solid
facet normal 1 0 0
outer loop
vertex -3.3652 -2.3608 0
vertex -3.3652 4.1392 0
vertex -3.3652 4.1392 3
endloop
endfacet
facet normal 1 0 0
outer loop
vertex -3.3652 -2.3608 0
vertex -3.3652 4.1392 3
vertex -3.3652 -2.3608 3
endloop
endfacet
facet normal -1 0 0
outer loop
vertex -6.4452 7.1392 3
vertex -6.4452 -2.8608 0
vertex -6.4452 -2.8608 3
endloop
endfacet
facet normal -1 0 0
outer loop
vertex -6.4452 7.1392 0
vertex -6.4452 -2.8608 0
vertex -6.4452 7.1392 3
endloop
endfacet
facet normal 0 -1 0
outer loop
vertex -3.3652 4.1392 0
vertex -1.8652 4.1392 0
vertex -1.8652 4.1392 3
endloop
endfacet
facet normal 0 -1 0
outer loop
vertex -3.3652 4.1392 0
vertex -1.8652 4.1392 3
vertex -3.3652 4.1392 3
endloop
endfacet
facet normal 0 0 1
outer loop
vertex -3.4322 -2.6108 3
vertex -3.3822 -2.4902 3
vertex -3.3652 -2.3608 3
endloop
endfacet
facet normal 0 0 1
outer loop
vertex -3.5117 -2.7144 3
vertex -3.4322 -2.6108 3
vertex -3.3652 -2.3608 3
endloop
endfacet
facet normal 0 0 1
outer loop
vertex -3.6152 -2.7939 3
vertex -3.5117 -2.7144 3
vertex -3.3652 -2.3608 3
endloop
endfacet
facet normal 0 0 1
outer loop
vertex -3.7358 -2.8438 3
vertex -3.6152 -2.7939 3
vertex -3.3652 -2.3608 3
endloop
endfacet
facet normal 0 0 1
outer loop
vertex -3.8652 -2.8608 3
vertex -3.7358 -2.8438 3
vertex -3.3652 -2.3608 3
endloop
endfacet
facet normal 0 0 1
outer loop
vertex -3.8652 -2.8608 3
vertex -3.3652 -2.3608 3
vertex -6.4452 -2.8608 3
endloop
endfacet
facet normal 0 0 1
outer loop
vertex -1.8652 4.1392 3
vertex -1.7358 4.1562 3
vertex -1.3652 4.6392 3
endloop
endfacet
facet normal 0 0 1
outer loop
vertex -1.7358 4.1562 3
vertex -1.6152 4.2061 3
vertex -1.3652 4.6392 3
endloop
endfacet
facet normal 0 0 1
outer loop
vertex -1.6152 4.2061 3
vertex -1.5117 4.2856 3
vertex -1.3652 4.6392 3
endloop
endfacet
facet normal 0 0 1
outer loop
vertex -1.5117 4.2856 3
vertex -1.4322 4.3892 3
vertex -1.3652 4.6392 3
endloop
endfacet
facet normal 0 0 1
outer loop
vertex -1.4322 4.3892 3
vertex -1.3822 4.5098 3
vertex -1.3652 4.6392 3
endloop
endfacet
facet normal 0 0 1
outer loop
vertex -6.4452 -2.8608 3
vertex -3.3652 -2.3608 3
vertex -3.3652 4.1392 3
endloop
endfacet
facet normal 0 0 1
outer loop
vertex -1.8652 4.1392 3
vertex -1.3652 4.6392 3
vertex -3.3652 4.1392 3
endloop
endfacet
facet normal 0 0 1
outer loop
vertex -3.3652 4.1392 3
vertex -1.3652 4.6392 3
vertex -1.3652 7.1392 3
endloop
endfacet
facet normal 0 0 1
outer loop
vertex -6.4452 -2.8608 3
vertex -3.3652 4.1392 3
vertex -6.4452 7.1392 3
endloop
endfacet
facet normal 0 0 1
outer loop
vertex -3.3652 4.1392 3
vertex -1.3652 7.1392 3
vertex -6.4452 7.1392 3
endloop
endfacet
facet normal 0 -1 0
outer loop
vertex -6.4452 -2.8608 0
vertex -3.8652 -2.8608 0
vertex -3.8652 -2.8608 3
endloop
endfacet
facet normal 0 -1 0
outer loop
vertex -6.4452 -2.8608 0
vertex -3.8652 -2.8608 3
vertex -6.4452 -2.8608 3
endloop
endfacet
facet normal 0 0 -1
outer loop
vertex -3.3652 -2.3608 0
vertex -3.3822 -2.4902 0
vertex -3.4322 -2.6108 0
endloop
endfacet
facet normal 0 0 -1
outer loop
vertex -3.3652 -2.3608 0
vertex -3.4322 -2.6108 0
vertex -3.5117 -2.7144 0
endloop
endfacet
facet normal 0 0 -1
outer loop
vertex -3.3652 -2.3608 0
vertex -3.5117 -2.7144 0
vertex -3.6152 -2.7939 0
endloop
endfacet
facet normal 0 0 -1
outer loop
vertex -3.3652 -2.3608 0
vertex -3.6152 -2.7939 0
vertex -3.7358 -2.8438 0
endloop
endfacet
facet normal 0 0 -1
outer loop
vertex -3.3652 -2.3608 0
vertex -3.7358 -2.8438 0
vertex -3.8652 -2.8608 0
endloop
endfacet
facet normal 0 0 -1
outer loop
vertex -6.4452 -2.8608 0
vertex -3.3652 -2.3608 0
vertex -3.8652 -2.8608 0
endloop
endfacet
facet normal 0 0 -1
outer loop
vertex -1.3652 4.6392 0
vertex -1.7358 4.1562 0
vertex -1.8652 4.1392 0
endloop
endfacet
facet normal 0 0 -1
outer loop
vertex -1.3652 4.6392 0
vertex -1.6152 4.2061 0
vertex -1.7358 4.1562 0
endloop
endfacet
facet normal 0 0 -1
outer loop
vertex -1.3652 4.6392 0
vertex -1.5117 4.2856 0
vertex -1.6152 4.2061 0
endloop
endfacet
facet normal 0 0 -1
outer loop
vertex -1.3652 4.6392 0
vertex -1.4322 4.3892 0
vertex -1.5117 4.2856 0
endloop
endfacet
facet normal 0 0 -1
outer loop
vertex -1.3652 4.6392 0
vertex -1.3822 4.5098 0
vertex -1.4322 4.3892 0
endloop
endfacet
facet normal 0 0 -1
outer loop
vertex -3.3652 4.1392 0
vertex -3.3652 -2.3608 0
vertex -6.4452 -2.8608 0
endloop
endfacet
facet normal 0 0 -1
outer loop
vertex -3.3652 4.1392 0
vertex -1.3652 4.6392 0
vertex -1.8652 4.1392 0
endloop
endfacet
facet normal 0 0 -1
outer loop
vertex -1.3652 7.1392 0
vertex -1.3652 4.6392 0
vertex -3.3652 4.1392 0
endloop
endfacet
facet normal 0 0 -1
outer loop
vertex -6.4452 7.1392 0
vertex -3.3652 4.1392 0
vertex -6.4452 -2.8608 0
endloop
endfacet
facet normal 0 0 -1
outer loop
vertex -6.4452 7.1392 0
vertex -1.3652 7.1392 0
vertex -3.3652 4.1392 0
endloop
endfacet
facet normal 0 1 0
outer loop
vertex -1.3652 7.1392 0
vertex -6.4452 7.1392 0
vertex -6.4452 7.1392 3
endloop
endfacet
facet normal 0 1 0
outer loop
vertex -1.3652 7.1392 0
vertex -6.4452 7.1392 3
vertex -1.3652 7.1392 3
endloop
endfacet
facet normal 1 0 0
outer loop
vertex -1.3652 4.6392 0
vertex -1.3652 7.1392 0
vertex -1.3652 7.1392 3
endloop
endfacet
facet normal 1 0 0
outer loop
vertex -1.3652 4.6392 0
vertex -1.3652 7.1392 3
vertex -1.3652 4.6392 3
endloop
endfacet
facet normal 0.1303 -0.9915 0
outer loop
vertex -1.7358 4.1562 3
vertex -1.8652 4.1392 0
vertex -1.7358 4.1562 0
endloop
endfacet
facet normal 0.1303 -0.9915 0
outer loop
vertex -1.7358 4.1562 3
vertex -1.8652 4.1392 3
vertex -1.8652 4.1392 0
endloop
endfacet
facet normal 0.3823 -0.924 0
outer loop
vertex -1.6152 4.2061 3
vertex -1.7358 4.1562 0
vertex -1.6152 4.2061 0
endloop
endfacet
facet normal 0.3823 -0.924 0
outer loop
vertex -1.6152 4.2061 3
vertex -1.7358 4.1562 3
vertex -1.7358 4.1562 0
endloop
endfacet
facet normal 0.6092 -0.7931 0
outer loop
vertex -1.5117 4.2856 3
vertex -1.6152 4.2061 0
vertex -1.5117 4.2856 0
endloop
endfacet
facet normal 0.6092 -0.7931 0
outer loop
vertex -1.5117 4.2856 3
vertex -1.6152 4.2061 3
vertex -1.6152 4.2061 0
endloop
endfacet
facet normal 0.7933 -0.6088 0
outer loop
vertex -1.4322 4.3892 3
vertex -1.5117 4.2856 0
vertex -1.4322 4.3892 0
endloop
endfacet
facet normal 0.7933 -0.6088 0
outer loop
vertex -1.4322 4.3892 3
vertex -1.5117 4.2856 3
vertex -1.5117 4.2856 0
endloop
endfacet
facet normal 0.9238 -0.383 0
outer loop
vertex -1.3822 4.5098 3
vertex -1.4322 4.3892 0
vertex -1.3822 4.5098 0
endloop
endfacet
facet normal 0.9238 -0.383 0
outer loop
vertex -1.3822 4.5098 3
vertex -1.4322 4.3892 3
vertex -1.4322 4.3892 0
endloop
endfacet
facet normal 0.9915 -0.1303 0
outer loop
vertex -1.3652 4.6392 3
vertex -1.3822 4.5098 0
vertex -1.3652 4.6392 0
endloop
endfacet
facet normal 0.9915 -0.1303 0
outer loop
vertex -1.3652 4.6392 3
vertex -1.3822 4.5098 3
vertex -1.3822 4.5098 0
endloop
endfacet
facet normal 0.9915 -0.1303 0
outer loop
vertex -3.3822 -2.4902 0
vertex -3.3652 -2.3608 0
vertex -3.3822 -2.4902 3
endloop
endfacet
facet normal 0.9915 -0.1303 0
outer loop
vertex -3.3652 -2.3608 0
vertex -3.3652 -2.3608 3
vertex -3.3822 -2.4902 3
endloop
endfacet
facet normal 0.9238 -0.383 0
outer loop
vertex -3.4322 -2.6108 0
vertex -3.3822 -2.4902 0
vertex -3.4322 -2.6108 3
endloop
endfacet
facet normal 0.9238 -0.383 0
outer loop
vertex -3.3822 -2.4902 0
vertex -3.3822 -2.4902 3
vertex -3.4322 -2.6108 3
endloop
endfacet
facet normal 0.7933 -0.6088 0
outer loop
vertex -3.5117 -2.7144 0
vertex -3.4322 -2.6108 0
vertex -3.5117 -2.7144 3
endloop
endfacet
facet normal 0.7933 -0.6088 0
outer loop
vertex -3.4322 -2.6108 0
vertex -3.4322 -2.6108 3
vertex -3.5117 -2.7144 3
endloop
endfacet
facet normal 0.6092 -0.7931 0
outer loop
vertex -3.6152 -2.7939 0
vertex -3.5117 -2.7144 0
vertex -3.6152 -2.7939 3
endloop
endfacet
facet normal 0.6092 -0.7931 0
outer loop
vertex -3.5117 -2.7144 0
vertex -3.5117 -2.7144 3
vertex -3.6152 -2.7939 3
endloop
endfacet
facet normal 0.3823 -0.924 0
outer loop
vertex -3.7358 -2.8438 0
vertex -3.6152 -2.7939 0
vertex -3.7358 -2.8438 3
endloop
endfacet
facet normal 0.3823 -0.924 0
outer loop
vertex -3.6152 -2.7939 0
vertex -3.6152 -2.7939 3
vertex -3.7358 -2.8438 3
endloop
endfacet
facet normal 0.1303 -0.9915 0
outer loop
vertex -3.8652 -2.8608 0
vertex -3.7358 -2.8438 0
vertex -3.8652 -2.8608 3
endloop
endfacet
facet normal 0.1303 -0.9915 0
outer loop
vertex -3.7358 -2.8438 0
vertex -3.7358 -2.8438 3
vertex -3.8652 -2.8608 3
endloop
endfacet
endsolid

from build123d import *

# Parameters (mm, degrees)
BOSS_EXTRUDE1_DEPTH = 3
FILLET1_R           = 0.5
FILLET3_R           = 0.5


with BuildPart() as part:
    # Sketch1 → Boss-Extrude1 (new body)
    with BuildSketch(Plane.XY):
        Polygon((-6.445210562, 7.139162572), (-1.365210562, 7.139162572), (-1.365210562, 4.139162572), (-3.365210562, 4.139162572), (-3.365210562, -2.860837428), (-6.445210562, -2.860837428), align=None)
    extrude(amount=BOSS_EXTRUDE1_DEPTH)

    # Fillet1
    fillet1_edges = [part.edges().sort_by_distance(p)[0] for p in [
        (-3.365210562, -2.860837428, 1.5),
    ]]
    fillet(fillet1_edges, radius=FILLET1_R)

    # Fillet3
    fillet3_edges = [part.edges().sort_by_distance(p)[0] for p in [
        (-1.365210562, 4.139162572, 1.5),
    ]]
    fillet(fillet3_edges, radius=FILLET3_R)


solid = part.part
